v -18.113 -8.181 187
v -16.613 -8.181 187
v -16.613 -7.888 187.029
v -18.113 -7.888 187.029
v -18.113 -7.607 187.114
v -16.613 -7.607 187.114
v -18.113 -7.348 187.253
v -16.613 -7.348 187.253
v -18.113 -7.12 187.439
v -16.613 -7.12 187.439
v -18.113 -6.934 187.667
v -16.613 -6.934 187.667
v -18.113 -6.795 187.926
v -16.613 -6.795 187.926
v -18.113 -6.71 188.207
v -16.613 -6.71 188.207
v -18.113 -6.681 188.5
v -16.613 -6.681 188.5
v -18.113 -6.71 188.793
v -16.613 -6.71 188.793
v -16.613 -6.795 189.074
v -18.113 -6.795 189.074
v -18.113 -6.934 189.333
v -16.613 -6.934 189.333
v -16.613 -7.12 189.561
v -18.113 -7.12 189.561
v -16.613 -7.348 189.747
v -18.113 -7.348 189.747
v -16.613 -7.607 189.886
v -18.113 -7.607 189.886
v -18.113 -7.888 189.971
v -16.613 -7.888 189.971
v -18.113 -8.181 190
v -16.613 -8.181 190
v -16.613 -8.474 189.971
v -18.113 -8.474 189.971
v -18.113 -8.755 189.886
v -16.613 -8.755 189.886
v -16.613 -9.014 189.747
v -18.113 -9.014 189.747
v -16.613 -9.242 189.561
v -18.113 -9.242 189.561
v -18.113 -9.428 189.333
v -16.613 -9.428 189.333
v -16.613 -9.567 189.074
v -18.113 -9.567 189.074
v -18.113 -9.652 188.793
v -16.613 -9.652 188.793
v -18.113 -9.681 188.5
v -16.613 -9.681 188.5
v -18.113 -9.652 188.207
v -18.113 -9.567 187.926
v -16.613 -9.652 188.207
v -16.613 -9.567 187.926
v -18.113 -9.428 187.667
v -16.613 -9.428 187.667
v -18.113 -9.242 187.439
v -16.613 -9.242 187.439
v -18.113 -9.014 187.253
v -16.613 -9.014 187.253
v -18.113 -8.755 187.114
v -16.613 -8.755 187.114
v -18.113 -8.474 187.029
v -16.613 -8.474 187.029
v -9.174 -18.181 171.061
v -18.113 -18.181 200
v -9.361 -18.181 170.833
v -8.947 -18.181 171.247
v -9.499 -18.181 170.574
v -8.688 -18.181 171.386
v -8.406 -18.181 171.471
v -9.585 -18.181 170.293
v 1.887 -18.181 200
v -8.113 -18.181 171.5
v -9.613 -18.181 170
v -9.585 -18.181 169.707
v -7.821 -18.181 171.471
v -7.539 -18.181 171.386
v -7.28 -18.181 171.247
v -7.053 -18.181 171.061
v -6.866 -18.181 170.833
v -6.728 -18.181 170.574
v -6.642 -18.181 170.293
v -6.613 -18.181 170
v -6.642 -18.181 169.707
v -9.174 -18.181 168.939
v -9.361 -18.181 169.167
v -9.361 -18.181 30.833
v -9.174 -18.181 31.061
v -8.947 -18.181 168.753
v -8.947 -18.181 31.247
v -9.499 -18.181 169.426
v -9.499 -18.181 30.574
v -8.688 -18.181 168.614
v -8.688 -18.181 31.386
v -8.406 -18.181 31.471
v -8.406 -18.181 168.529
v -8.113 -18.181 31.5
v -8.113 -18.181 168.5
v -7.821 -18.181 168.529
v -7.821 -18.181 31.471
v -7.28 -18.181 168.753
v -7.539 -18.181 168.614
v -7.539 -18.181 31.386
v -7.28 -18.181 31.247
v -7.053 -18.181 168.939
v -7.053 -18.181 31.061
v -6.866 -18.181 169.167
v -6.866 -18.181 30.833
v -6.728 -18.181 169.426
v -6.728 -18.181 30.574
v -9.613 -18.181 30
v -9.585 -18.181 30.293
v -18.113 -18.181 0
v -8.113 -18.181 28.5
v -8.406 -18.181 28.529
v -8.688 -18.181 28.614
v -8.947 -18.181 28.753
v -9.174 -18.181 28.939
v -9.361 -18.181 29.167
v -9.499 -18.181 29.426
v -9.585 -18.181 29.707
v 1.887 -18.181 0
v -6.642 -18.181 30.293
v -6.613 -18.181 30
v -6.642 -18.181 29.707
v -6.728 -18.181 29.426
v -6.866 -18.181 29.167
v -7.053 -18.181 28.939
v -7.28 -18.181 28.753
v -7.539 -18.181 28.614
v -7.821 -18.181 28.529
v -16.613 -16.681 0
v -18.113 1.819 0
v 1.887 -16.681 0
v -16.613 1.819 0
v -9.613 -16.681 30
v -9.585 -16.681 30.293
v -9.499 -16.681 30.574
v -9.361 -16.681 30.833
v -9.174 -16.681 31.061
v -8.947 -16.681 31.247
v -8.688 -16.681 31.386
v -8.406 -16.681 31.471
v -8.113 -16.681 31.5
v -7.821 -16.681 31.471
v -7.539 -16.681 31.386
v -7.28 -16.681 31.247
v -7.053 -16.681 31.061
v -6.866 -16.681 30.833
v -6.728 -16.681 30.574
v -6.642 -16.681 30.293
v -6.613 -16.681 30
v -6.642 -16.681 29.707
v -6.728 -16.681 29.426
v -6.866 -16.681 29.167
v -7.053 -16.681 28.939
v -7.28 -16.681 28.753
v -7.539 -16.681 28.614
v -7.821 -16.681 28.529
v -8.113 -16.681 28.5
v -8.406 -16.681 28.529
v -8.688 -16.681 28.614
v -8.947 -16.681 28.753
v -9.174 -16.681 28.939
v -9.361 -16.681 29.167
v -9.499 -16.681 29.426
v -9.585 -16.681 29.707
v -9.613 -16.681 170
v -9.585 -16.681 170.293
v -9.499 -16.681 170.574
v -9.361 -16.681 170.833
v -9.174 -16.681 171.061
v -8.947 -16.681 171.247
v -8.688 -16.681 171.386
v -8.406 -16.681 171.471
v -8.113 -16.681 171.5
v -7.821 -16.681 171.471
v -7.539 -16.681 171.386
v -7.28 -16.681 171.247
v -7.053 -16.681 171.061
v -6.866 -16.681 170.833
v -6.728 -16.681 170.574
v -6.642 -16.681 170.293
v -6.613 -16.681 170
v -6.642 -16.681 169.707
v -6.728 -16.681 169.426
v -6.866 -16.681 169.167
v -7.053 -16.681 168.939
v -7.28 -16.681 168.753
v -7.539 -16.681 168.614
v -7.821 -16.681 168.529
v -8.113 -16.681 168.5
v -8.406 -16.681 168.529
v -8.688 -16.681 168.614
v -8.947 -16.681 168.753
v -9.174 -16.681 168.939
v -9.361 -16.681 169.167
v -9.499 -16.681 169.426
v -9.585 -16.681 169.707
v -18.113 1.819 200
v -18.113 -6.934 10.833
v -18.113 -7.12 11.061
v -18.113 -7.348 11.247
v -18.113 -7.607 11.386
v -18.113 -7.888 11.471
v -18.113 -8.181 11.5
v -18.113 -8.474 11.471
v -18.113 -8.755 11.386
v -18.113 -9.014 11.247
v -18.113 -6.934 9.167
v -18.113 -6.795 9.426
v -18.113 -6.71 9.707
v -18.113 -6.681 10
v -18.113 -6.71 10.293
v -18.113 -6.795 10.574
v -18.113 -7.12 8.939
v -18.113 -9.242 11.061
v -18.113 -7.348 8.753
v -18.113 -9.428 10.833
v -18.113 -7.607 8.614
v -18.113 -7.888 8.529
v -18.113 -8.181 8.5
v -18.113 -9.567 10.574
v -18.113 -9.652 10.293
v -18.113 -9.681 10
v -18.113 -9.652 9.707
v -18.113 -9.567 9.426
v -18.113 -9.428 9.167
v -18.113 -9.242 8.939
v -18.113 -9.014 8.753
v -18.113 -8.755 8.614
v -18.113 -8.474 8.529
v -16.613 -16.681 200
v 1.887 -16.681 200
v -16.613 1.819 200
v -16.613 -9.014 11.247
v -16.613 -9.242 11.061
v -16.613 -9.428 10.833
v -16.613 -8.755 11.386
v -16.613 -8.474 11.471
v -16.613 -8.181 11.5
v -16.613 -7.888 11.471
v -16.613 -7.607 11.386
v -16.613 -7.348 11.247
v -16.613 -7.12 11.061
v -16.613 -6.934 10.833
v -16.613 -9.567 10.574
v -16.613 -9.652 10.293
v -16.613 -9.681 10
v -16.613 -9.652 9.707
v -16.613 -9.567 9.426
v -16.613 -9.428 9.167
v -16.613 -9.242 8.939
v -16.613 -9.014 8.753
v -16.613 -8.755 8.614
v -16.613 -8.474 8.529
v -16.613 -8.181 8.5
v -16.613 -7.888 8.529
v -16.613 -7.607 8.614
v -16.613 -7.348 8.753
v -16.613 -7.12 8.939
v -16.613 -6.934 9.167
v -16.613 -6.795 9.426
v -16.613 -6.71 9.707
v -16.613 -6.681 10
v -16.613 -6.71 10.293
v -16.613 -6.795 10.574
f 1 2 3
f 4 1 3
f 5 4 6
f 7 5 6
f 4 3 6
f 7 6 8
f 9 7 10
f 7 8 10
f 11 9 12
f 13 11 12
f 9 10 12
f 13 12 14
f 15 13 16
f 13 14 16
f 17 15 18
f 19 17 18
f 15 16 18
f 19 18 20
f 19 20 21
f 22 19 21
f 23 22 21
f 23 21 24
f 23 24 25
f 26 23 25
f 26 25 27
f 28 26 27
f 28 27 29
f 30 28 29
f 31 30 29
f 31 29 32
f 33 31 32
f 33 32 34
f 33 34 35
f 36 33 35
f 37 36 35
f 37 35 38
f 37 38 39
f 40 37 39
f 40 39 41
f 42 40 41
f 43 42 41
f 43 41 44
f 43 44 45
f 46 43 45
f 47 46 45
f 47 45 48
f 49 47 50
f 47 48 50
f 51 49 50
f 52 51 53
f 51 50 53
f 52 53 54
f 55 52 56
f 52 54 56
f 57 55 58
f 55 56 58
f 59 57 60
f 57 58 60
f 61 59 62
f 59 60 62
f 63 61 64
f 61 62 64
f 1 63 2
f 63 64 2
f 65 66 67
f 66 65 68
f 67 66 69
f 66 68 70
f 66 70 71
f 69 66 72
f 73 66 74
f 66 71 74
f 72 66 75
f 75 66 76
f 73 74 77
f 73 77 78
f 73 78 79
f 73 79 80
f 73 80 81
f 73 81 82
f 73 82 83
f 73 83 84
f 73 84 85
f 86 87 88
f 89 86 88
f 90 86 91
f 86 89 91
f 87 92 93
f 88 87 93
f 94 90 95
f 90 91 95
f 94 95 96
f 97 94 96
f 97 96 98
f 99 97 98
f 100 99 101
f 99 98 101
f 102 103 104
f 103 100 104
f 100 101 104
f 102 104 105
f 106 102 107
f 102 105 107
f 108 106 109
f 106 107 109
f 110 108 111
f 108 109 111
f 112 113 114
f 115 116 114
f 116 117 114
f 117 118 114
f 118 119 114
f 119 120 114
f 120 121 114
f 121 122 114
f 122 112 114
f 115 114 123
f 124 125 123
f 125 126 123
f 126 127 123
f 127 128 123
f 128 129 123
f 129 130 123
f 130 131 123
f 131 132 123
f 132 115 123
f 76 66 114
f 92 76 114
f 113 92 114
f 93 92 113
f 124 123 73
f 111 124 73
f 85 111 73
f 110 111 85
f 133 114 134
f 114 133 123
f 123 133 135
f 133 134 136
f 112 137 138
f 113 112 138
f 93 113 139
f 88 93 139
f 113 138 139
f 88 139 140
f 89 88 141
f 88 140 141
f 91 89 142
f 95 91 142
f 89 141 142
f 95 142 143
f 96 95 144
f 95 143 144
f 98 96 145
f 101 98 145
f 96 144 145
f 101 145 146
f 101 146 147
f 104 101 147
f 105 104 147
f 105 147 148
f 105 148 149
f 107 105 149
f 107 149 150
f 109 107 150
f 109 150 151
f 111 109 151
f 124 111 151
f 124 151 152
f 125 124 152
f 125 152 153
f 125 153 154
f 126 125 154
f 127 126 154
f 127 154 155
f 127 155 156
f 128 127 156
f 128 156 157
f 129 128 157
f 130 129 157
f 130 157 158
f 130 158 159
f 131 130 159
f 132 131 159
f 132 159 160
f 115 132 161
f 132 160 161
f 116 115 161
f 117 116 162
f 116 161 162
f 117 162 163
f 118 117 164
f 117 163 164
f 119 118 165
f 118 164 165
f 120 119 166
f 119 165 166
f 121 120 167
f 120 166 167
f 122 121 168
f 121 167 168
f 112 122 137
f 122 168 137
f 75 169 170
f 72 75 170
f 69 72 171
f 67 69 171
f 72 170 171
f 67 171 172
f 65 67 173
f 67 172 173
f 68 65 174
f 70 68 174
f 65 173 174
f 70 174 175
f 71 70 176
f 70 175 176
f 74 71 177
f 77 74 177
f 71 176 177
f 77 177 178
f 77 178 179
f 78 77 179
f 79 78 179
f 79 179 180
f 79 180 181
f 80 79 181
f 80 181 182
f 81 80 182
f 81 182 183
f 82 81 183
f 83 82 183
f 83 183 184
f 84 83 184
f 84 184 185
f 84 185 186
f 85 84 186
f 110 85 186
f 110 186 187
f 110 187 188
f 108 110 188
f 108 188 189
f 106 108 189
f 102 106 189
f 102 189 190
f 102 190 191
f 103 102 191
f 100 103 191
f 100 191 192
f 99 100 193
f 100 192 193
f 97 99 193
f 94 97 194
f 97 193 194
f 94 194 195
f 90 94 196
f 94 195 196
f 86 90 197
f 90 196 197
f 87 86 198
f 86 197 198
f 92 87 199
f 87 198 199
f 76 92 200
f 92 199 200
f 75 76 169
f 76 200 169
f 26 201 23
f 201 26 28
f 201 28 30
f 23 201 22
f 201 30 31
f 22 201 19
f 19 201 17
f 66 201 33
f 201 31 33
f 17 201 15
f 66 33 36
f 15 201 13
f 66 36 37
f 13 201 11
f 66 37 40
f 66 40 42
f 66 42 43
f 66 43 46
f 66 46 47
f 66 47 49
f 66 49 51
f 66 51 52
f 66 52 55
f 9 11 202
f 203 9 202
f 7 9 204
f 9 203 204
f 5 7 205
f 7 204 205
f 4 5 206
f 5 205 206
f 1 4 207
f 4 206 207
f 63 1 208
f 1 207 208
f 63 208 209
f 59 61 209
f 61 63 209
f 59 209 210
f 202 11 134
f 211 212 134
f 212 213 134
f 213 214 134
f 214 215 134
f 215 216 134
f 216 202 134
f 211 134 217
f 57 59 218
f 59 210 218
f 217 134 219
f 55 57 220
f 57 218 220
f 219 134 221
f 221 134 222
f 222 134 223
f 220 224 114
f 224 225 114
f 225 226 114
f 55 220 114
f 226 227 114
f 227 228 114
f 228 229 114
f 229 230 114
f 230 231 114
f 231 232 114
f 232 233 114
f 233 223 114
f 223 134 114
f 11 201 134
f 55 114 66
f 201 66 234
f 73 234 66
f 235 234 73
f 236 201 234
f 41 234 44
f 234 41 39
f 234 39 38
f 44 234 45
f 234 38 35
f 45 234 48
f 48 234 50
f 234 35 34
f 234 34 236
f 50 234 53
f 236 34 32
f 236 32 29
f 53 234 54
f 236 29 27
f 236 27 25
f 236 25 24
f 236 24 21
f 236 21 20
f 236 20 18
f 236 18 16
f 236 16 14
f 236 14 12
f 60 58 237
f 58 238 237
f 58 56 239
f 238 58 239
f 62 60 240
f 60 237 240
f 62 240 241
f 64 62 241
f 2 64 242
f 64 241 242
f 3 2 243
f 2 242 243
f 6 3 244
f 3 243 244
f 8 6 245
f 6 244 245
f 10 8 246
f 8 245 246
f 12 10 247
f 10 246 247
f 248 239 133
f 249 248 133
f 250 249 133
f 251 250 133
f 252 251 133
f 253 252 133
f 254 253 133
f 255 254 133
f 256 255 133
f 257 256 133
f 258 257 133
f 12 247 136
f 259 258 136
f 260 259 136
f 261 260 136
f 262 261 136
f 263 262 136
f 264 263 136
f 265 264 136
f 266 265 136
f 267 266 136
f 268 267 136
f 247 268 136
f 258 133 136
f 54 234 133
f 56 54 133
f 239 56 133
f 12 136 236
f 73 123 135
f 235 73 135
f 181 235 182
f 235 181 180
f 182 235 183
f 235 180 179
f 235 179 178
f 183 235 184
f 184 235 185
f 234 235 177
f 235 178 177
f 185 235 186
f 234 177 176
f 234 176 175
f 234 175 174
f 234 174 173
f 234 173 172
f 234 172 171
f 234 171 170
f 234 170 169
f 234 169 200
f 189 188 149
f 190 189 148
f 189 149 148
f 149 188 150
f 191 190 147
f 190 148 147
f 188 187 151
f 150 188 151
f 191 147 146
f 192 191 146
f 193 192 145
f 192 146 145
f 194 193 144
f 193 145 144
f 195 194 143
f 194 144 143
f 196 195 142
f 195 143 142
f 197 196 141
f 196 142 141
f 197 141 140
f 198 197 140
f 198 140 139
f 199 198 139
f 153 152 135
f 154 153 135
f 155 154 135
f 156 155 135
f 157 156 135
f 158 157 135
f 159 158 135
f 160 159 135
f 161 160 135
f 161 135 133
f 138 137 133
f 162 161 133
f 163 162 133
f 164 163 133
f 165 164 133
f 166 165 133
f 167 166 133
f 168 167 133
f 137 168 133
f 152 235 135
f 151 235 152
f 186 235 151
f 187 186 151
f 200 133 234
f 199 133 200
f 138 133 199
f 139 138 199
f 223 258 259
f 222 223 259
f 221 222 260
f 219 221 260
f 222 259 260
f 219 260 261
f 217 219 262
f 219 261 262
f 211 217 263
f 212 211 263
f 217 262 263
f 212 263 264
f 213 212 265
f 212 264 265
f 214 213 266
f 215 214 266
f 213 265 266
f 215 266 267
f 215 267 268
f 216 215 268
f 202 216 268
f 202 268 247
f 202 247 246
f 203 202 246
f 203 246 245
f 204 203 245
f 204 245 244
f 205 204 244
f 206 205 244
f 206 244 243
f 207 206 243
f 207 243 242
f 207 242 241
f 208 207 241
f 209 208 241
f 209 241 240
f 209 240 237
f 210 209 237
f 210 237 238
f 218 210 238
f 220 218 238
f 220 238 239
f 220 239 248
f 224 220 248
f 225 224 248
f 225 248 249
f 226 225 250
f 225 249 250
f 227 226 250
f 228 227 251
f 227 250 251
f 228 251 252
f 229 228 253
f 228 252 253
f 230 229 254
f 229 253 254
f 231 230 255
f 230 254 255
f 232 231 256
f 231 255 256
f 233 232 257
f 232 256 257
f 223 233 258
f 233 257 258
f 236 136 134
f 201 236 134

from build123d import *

# Parameters (mm, degrees)
EXTRUSION1_DEPTH = 200
ESQUISSE3_R      = 1.5
EXTRUSION3_DEPTH = 150
ESQUISSE2_R      = 1.5
EXTRUSION4_DEPTH = 100


with BuildPart() as part:
    # Esquisse1 → Extrusion1 (new body)
    with BuildSketch(Plane.XY):
        Polygon((-18.113475854, 1.818947368), (-18.113475854, -18.181052632), (1.886524146, -18.181052632), (1.886524146, -16.681052632), (-16.613475854, -16.681052632), (-16.613475854, 1.818947368), align=None)
    extrude(amount=EXTRUSION1_DEPTH)

    # Esquisse3 → Extrusion3 (cut)
    with BuildSketch(Plane(origin=(-16.613475854, 0, 0), x_dir=(0, 0, -1), z_dir=(1, 0, 0))):
        with Locations((-10, -8.181052632)):
            Circle(ESQUISSE3_R)
        with Locations((-188.5, -8.181052632)):
            Circle(ESQUISSE3_R)
    extrude(amount=-EXTRUSION3_DEPTH, mode=Mode.SUBTRACT)

    # Esquisse2 → Extrusion4 (cut)
    with BuildSketch(Plane(origin=(0, -16.681052632, 0), x_dir=(-1, 0, 0), z_dir=(0, 1, 0))):
        with Locations((8.113475854, 170)):
            Circle(ESQUISSE2_R)
        with Locations((8.113475854, 30)):
            Circle(ESQUISSE2_R)
    extrude(amount=-EXTRUSION4_DEPTH, mode=Mode.SUBTRACT)


solid = part.part
